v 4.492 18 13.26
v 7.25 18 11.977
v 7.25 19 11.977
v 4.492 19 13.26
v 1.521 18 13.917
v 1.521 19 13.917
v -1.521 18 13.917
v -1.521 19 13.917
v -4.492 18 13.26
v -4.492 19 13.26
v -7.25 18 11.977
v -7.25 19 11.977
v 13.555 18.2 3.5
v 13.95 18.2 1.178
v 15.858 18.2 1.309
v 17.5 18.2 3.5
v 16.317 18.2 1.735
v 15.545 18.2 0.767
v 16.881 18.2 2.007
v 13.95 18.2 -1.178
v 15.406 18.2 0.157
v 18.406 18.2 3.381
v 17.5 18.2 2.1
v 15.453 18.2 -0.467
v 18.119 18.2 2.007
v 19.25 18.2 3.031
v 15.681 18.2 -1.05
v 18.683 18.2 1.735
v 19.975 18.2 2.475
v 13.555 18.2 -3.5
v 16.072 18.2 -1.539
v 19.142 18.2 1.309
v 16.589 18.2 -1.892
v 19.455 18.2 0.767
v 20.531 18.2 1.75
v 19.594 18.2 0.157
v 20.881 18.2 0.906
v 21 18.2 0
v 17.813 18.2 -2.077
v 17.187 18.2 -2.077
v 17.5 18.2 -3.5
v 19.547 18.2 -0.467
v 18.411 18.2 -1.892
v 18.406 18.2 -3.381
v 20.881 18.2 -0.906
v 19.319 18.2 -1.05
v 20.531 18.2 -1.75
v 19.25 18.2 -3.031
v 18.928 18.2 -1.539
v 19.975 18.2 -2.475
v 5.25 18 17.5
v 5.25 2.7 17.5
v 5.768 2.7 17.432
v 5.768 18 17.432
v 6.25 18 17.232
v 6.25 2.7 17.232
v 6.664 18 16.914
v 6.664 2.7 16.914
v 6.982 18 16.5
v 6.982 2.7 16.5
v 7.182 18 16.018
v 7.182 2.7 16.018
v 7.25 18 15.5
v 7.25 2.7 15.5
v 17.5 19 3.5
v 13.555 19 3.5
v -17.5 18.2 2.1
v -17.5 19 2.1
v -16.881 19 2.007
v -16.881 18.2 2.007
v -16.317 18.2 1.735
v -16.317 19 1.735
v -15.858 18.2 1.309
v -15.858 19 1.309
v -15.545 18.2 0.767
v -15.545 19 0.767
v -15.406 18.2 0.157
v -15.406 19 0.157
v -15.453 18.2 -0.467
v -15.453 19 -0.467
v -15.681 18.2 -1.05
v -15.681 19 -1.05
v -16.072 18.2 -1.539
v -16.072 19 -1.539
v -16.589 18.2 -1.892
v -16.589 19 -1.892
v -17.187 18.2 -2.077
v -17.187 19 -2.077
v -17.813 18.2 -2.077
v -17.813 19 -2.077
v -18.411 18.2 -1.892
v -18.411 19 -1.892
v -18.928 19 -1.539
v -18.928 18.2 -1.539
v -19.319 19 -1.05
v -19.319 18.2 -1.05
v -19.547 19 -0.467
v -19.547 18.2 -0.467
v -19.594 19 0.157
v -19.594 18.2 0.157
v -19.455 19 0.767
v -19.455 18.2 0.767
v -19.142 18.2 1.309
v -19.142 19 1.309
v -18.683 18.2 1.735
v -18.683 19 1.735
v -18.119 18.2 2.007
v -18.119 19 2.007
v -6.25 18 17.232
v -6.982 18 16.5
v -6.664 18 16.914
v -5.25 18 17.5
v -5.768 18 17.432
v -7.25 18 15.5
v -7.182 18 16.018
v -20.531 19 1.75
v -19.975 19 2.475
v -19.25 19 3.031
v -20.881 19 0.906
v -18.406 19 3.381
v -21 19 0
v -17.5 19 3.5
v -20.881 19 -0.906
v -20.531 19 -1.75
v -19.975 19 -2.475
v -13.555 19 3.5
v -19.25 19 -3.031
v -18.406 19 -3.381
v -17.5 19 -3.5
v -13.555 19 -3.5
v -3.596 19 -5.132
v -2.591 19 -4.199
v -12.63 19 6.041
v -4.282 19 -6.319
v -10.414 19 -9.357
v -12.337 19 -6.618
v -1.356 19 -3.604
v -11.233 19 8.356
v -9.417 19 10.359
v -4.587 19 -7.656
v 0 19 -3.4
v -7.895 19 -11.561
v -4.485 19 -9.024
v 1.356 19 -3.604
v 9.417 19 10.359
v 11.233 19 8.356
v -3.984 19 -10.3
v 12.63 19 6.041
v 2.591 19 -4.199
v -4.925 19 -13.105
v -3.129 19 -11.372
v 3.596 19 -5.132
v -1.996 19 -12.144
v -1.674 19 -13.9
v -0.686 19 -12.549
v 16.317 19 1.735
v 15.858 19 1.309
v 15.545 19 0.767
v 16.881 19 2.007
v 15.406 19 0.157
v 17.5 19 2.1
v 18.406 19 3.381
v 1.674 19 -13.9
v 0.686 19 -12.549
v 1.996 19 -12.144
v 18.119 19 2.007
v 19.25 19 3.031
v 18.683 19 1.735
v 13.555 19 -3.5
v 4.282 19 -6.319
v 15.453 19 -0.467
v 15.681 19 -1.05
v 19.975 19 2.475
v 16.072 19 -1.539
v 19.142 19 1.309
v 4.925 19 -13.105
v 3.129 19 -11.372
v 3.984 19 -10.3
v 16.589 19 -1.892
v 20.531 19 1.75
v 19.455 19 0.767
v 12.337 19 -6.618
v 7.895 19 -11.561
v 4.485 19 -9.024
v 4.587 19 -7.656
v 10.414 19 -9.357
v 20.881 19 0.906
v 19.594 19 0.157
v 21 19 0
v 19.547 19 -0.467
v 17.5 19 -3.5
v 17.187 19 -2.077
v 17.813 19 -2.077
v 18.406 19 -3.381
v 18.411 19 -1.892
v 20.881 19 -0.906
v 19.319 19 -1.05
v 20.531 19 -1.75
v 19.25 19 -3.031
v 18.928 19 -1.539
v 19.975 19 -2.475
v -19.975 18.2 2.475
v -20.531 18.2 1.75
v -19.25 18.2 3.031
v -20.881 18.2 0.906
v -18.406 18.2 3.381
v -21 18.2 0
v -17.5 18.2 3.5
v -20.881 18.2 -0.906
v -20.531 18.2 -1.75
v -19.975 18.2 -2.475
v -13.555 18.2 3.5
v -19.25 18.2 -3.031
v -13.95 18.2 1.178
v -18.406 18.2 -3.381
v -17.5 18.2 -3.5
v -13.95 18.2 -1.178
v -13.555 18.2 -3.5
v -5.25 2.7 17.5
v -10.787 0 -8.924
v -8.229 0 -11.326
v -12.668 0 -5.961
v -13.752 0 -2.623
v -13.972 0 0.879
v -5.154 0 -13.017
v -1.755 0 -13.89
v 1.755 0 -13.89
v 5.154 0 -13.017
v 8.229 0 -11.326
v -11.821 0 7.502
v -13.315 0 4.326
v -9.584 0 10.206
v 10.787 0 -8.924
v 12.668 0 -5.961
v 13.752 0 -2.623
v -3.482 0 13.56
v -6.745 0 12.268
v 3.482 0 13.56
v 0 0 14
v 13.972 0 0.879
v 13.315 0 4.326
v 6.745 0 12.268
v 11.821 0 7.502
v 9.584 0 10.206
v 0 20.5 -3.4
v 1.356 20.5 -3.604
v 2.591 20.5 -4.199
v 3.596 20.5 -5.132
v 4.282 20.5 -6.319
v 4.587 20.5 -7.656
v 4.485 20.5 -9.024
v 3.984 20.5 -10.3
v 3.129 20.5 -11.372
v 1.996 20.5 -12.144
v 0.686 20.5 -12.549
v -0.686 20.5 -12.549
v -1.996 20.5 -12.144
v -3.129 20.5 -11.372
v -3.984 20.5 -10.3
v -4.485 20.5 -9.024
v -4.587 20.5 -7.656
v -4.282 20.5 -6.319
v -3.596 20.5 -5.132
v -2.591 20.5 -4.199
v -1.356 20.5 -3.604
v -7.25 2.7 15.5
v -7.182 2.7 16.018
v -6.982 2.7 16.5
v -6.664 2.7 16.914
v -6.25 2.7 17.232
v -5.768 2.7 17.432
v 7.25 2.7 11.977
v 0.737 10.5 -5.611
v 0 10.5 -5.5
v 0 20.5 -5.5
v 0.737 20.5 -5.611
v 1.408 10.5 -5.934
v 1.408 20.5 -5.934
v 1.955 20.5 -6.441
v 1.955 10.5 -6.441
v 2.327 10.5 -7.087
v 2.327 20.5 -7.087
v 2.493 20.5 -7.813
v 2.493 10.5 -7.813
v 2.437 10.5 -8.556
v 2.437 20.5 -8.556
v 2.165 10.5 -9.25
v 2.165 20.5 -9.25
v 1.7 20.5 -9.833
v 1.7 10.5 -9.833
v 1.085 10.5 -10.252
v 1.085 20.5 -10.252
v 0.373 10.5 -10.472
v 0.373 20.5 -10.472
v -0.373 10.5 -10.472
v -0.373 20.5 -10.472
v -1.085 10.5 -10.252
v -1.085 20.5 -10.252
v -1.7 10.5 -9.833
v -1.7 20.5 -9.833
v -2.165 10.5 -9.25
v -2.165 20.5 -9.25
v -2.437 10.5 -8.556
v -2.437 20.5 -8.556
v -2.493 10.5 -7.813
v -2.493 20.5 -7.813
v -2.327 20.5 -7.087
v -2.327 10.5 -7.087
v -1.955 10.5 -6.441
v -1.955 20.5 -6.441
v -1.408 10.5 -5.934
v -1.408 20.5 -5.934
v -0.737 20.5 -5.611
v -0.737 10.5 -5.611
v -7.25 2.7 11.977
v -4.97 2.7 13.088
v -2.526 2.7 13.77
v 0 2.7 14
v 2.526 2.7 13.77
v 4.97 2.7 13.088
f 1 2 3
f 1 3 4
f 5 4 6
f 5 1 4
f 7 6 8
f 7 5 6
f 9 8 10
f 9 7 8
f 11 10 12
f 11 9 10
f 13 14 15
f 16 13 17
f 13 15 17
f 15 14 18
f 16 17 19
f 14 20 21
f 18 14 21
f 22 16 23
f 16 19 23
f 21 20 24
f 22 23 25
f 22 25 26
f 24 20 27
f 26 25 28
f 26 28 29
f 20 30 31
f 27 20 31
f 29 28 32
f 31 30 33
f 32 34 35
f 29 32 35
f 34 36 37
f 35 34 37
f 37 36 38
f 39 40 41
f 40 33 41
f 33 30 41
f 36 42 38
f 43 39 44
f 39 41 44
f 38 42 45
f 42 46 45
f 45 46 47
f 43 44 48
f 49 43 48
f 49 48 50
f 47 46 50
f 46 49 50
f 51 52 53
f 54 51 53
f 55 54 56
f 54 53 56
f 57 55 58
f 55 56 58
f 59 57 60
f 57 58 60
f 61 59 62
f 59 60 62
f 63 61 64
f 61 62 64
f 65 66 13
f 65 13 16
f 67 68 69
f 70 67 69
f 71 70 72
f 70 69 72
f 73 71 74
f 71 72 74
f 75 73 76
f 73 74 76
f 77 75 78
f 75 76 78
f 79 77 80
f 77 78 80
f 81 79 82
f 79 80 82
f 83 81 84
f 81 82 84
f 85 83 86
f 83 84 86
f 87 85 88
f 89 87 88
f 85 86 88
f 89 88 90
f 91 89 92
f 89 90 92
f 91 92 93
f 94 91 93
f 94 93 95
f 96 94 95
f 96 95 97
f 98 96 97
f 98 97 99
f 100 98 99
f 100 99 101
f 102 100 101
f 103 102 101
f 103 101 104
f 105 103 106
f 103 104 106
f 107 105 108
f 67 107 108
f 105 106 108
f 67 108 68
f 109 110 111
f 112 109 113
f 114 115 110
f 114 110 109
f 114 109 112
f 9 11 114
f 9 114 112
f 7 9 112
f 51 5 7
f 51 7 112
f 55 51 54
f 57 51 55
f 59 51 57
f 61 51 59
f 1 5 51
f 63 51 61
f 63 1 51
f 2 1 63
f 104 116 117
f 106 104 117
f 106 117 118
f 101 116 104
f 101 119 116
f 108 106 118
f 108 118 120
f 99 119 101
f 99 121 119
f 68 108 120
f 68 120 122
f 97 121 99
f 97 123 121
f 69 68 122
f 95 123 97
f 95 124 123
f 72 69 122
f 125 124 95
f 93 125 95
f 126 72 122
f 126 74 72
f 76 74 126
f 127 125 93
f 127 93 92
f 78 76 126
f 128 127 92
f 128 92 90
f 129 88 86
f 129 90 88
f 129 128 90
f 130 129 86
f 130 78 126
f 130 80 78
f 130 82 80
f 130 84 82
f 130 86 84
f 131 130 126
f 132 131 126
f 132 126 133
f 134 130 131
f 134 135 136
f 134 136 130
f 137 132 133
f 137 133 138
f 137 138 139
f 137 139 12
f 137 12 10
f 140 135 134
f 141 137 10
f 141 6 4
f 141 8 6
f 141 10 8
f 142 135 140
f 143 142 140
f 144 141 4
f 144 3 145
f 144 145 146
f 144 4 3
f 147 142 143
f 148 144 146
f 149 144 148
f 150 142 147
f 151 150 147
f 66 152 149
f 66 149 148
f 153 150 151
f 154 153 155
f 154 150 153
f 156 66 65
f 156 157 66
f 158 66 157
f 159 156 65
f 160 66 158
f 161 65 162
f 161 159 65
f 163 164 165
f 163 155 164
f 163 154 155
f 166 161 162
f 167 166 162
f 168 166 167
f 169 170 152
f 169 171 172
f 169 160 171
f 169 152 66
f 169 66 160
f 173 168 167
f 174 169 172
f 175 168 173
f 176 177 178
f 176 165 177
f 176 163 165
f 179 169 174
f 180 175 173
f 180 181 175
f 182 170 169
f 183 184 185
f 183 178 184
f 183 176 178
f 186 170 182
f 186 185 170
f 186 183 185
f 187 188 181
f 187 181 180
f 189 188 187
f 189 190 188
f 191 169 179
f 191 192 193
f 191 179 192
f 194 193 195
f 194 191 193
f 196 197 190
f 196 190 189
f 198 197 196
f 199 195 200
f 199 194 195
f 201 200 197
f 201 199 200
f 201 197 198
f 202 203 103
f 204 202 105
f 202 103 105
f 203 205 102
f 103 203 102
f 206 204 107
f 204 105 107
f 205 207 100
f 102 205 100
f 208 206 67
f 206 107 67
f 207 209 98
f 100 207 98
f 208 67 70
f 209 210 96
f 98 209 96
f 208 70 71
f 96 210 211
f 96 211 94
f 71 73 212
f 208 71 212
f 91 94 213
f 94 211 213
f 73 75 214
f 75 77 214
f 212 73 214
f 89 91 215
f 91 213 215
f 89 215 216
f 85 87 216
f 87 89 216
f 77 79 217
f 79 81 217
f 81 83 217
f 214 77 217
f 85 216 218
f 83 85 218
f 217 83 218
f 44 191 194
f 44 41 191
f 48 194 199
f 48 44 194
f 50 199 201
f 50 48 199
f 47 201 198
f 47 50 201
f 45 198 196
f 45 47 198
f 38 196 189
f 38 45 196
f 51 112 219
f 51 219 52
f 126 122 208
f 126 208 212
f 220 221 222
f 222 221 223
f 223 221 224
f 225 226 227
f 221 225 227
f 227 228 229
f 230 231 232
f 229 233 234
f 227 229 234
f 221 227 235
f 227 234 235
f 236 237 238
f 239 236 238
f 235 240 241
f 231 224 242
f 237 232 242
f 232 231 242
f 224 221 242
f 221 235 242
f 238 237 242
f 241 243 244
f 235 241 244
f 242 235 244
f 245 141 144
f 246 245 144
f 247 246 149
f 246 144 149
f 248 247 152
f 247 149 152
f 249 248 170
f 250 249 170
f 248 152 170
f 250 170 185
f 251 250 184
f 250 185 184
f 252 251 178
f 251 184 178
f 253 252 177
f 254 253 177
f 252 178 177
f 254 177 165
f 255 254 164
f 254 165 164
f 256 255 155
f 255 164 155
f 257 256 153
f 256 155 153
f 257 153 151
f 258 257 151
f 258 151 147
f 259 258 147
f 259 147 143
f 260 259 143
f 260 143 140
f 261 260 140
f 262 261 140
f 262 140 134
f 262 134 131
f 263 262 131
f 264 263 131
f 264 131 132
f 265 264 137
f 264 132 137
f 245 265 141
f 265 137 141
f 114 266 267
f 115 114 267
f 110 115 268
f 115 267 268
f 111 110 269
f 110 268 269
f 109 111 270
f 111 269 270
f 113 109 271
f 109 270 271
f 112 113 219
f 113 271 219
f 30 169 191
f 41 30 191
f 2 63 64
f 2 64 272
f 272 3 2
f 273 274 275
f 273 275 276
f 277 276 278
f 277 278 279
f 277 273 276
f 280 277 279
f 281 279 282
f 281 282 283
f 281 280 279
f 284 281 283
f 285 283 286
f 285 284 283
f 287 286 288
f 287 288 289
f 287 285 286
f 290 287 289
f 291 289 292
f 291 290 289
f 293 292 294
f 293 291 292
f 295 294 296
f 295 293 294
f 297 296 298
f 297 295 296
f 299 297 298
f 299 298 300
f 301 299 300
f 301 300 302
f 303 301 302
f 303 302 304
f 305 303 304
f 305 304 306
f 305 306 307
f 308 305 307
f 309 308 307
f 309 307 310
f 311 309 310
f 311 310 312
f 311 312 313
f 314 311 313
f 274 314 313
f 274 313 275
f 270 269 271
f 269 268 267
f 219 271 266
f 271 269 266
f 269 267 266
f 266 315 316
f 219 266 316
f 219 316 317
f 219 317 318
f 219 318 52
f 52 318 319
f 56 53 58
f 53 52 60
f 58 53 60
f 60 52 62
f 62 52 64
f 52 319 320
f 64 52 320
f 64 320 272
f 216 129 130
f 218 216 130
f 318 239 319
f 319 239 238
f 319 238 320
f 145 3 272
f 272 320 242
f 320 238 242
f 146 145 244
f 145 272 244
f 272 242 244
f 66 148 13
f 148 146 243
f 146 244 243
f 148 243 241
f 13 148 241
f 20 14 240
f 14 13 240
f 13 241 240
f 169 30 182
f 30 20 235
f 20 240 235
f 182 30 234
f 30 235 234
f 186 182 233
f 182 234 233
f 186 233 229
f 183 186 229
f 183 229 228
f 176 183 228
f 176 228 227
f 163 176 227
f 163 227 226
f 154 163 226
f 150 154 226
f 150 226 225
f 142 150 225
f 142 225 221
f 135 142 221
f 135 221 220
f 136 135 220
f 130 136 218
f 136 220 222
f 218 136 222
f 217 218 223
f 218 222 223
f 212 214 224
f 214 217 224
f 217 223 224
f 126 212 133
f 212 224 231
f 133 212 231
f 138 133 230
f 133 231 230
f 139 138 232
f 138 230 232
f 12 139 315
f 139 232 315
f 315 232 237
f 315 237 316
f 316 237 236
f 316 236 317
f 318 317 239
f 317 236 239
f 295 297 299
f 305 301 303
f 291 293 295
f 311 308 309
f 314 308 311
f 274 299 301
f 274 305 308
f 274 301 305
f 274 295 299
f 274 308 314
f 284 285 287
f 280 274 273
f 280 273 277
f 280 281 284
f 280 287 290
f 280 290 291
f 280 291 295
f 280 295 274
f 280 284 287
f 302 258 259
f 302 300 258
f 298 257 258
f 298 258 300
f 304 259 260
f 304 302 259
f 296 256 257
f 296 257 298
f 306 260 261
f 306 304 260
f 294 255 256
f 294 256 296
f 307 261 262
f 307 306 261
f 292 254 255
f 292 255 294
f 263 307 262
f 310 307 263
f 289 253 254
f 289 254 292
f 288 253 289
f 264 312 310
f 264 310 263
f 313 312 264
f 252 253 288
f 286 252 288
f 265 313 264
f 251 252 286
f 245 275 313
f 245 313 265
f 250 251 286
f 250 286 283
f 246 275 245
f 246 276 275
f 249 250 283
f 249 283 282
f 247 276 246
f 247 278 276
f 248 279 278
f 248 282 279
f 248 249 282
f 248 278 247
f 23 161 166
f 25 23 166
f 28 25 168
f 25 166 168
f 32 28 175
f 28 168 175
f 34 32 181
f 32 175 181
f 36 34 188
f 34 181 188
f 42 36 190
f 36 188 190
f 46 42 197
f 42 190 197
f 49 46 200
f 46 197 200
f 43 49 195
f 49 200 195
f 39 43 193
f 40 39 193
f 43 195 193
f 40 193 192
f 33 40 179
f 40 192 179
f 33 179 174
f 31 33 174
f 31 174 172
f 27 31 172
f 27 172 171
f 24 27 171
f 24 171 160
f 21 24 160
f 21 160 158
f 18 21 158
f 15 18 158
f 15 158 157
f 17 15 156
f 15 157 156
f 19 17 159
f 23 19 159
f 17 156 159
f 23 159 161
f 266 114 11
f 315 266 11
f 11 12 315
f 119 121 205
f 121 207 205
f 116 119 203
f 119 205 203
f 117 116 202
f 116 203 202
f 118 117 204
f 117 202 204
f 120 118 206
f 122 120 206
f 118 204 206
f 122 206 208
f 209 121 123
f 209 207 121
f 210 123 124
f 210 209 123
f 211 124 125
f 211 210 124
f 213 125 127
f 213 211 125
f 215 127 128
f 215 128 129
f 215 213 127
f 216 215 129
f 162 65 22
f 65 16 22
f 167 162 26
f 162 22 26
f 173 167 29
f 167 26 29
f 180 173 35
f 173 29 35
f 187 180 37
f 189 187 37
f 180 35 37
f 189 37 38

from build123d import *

# Parameters (mm, degrees)
ESQUISSE1_R             = 14
BOSS_EXTRU_1_DEPTH      = 19
ESQUISSE2_W             = 42
ESQUISSE2_H             = 7
ESQUISSE2_R             = 2.1
BOSS_EXTRU_2_DEPTH      = 0.8
CONG_1_R                = 3.5
ESQUISSE3_W             = 14.5
ESQUISSE3_H             = 8
BOSS_EXTRU_3_DEPTH      = 16.3
CONG_2_R                = 2
ESQUISSE4_R             = 4.6
BOSS_EXTRU_4_DEPTH      = 1.5
ESQUISSE5_R             = 2.5
BOSS_EXTRU_5_DEPTH      = 8.5
ESQUISSE6_W             = 12.644639
ESQUISSE6_H             = 4.455106
ESQUISSE6_W_2           = 15.068741
ESQUISSE6_H_2           = 4.782687
ENL_V_MAT_EXTRU_1_DEPTH = 6
ENL_V_START             = -1
ENL_V_MAT_EXTRU_2_DEPTH = 1
ENL_V_START_2           = -18.5
ESQUISSE8_R             = 2.5
ENL_V_MAT_EXTRU_3_DEPTH = 18.5


with BuildPart() as part:
    # Esquisse1 → Boss.-Extru.1 (new body)
    with BuildSketch(Plane(origin=(0, 0, 0), x_dir=(1, 0, 0), z_dir=(0, 1, 0))):
        with Locations(Location((0, 0, 0), (0, 0, 270))):
            Circle(ESQUISSE1_R)
    extrude(amount=BOSS_EXTRU_1_DEPTH)

    # Esquisse2 → Boss.-Extru.2 (add)
    with BuildSketch(Plane(origin=(0, 19, 0), x_dir=(1, 0, 0), z_dir=(0, 1, 0))):
        Rectangle(ESQUISSE2_W, ESQUISSE2_H)
        with Locations(Location((-17.5, 0, 0), (0, 0, 270))):
            Circle(ESQUISSE2_R, mode=Mode.SUBTRACT)
        with Locations(Location((17.5, 0, 0), (0, 0, 270))):
            Circle(ESQUISSE2_R, mode=Mode.SUBTRACT)
    extrude(amount=-BOSS_EXTRU_2_DEPTH)

    # Congé1
    cong_1_edges = [part.edges().sort_by_distance(p)[0] for p in [
        (21, 18.6, 3.5),
        (21, 18.6, -3.5),
        (-21, 18.6, 3.5),
        (-21, 18.6, -3.5),
    ]]
    fillet(cong_1_edges, radius=CONG_1_R - 0.0001)  # a hair under: the kernel refuses the full size

    # Esquisse3 → Boss.-Extru.3 (add)
    with BuildSketch(Plane(origin=(0, 19, 0), x_dir=(1, 0, 0), z_dir=(0, 1, 0))):
        with Locations((0, -13.5)):
            Rectangle(ESQUISSE3_W, ESQUISSE3_H)
    extrude(amount=-BOSS_EXTRU_3_DEPTH)

    # Congé2
    cong_2_edges = [part.edges().sort_by_distance(p)[0] for p in [
        (-7.25, 10.85, 17.5),
        (7.25, 10.85, 17.5),
    ]]
    fillet(cong_2_edges, radius=CONG_2_R)

    # Esquisse4 → Boss.-Extru.4 (add)
    with BuildSketch(Plane(origin=(0, 19, 0), x_dir=(1, 0, 0), z_dir=(0, 1, 0))):
        with Locations(Location((0, 8, 0), (0, 0, 270))):
            Circle(ESQUISSE4_R)
    extrude(amount=BOSS_EXTRU_4_DEPTH)

    # Esquisse5 → Boss.-Extru.5 (add)
    with BuildSketch(Plane(origin=(0, 20.5, 0), x_dir=(1, 0, 0), z_dir=(0, 1, 0))):
        with Locations(Location((0, 8, 0), (0, 0, 270))):
            Circle(ESQUISSE5_R)
    extrude(amount=BOSS_EXTRU_5_DEPTH)

    # Esquisse6 → Enlèv. mat.-Extru.1 (cut)
    with BuildSketch(Plane(origin=(0, 29, 0), x_dir=(1, 0, 0), z_dir=(0, 1, 0))):
        with Locations((0.098275, 11.727553)):
            Rectangle(ESQUISSE6_W, ESQUISSE6_H)
        with Locations((0.065517, 4.108657)):
            Rectangle(ESQUISSE6_W_2, ESQUISSE6_H_2)
    extrude(amount=-ENL_V_MAT_EXTRU_1_DEPTH, mode=Mode.SUBTRACT)

    # Esquisse7 → Enlèv. mat.-Extru.2 (cut)
    with BuildSketch(Plane(origin=(0, 19, 0), x_dir=(1, 0, 0), z_dir=(0, 1, 0)).offset(ENL_V_START)):
        with BuildLine():
            Line((-7.25, -11.97654), (-7.25, -22.169225))
            Line((-7.25, -22.169225), (7.25, -22.169225))
            Line((7.25, -22.169225), (7.25, -11.97654))
            ThreePointArc((7.25, -11.97654), (0, -14), (-7.25, -11.97654))
        make_face()
    extrude(amount=ENL_V_MAT_EXTRU_2_DEPTH, mode=Mode.SUBTRACT)

    # Esquisse8 → Enlèv. mat.-Extru.3 (cut)
    with BuildSketch(Plane(origin=(0, 29, 0), x_dir=(1, 0, 0), z_dir=(0, 1, 0)).offset(ENL_V_START_2)):
        with Locations(Location((0, 8, 0), (0, 0, 270))):
            Circle(ESQUISSE8_R)
    extrude(amount=ENL_V_MAT_EXTRU_3_DEPTH, mode=Mode.SUBTRACT)


solid = part.part
